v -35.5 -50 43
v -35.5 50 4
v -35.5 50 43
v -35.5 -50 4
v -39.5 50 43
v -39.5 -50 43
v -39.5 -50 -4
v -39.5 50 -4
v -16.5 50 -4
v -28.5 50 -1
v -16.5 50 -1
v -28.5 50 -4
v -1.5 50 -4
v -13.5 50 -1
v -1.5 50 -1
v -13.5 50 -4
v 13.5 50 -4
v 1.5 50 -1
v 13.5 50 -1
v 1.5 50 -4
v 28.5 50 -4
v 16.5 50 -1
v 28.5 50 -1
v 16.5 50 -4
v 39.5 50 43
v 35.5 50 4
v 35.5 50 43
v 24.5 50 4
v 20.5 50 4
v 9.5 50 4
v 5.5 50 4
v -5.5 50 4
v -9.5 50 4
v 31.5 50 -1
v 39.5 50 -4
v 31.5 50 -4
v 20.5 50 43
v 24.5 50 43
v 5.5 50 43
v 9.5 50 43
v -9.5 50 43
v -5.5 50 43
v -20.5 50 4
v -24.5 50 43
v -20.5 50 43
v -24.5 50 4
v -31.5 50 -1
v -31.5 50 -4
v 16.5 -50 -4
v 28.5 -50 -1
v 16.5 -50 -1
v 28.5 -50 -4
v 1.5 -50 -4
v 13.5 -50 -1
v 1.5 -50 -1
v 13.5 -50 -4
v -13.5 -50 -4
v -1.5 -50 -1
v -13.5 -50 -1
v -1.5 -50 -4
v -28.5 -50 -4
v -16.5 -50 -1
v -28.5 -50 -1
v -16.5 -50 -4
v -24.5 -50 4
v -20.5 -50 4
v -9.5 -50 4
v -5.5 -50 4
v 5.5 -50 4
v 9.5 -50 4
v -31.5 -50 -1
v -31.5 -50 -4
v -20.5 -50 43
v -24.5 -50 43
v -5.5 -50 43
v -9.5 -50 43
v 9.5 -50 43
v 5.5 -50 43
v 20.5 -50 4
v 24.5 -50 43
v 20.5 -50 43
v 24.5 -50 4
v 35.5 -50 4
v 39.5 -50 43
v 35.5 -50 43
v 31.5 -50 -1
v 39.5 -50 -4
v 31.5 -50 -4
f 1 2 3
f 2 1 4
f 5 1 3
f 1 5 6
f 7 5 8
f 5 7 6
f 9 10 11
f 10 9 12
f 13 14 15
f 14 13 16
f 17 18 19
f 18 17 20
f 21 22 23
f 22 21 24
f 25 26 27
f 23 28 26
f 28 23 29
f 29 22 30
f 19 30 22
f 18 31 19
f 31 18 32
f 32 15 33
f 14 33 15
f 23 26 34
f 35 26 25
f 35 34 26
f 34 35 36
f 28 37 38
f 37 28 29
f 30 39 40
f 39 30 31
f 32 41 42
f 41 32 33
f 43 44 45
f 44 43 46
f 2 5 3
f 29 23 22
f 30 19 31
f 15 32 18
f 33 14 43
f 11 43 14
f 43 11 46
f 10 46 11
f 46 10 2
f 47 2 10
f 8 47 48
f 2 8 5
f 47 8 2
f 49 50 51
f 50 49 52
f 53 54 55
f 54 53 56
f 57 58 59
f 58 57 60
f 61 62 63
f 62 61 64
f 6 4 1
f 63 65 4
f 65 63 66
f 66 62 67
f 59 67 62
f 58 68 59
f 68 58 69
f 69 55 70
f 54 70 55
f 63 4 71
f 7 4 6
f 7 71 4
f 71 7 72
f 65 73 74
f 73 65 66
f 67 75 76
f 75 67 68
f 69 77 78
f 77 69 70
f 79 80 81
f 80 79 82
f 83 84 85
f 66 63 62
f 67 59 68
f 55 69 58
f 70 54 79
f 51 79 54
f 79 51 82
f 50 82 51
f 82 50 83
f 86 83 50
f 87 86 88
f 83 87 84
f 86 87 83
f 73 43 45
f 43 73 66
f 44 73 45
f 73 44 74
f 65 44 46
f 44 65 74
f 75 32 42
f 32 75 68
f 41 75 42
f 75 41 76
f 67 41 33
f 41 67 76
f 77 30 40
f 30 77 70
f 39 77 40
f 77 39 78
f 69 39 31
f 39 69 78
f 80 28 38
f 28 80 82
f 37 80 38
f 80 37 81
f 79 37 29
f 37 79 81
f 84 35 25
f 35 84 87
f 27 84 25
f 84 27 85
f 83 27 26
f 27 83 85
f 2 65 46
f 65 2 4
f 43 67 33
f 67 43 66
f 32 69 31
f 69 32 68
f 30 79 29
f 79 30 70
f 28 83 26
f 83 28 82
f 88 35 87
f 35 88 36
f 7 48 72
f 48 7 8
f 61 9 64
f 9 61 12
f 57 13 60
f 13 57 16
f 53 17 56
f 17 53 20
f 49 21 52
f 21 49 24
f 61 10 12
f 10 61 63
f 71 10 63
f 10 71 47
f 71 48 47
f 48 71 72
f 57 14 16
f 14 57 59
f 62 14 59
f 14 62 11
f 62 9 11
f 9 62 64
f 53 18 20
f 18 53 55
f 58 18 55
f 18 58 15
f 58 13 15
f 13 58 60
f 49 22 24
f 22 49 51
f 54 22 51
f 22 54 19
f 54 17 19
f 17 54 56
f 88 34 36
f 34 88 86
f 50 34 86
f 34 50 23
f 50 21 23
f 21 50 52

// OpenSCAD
//Drew Vincent
//MSE4777 Fall 2019
//Customizable Model

//Customizable Charging Station
//Desktop charging station with a customizable amount of slots and customizable slot width. Each slot will have a path for the charging cable to be ran through.

//Parameters
num_slots = 5; //Input number of slots
slot_width = 11; //Input slot width in mm
slot_height = 35; //Input slot height in mm
slot_wall_width = 4; //Input slot wall width mm (recommended 2mm or above)
base_length = 100; //Input depth of charge sation
base_height = 8; //Input height of base
path_width = 3; //Input width of cable paths
path_height = 3; //Input height of cable paths

//Creation of the charging station
difference() {
union() {
//Base
overall_width = (num_slots * slot_width) + ((num_slots + 1) * slot_wall_width);
cube([overall_width, base_length, base_height], center = true);

//Slots
overall_height = slot_height + base_height;
first_slot_x = (slot_wall_width / 2) - (overall_width / 2);
first_slot_z = overall_height / 2;
for (N = [0:num_slots]) {
translate([first_slot_x + (N * slot_width) + (N * slot_wall_width), 0, first_slot_z])
cube([slot_wall_width, base_length, overall_height], center = true);
}
}

union() {
//Cable Paths
overall_width = (num_slots * slot_width) + ((num_slots + 1) * slot_wall_width);
first_path_x = -(overall_width / 2) + slot_wall_width + (slot_width / 2);
first_path_z = -(base_height / 2);
for (P = [0:num_slots - 1]) {
translate([first_path_x + (P * slot_width) + (P * slot_wall_width), 0, first_path_z])
cube([path_width, base_length, path_height * 2], center = true);
}
}
}
